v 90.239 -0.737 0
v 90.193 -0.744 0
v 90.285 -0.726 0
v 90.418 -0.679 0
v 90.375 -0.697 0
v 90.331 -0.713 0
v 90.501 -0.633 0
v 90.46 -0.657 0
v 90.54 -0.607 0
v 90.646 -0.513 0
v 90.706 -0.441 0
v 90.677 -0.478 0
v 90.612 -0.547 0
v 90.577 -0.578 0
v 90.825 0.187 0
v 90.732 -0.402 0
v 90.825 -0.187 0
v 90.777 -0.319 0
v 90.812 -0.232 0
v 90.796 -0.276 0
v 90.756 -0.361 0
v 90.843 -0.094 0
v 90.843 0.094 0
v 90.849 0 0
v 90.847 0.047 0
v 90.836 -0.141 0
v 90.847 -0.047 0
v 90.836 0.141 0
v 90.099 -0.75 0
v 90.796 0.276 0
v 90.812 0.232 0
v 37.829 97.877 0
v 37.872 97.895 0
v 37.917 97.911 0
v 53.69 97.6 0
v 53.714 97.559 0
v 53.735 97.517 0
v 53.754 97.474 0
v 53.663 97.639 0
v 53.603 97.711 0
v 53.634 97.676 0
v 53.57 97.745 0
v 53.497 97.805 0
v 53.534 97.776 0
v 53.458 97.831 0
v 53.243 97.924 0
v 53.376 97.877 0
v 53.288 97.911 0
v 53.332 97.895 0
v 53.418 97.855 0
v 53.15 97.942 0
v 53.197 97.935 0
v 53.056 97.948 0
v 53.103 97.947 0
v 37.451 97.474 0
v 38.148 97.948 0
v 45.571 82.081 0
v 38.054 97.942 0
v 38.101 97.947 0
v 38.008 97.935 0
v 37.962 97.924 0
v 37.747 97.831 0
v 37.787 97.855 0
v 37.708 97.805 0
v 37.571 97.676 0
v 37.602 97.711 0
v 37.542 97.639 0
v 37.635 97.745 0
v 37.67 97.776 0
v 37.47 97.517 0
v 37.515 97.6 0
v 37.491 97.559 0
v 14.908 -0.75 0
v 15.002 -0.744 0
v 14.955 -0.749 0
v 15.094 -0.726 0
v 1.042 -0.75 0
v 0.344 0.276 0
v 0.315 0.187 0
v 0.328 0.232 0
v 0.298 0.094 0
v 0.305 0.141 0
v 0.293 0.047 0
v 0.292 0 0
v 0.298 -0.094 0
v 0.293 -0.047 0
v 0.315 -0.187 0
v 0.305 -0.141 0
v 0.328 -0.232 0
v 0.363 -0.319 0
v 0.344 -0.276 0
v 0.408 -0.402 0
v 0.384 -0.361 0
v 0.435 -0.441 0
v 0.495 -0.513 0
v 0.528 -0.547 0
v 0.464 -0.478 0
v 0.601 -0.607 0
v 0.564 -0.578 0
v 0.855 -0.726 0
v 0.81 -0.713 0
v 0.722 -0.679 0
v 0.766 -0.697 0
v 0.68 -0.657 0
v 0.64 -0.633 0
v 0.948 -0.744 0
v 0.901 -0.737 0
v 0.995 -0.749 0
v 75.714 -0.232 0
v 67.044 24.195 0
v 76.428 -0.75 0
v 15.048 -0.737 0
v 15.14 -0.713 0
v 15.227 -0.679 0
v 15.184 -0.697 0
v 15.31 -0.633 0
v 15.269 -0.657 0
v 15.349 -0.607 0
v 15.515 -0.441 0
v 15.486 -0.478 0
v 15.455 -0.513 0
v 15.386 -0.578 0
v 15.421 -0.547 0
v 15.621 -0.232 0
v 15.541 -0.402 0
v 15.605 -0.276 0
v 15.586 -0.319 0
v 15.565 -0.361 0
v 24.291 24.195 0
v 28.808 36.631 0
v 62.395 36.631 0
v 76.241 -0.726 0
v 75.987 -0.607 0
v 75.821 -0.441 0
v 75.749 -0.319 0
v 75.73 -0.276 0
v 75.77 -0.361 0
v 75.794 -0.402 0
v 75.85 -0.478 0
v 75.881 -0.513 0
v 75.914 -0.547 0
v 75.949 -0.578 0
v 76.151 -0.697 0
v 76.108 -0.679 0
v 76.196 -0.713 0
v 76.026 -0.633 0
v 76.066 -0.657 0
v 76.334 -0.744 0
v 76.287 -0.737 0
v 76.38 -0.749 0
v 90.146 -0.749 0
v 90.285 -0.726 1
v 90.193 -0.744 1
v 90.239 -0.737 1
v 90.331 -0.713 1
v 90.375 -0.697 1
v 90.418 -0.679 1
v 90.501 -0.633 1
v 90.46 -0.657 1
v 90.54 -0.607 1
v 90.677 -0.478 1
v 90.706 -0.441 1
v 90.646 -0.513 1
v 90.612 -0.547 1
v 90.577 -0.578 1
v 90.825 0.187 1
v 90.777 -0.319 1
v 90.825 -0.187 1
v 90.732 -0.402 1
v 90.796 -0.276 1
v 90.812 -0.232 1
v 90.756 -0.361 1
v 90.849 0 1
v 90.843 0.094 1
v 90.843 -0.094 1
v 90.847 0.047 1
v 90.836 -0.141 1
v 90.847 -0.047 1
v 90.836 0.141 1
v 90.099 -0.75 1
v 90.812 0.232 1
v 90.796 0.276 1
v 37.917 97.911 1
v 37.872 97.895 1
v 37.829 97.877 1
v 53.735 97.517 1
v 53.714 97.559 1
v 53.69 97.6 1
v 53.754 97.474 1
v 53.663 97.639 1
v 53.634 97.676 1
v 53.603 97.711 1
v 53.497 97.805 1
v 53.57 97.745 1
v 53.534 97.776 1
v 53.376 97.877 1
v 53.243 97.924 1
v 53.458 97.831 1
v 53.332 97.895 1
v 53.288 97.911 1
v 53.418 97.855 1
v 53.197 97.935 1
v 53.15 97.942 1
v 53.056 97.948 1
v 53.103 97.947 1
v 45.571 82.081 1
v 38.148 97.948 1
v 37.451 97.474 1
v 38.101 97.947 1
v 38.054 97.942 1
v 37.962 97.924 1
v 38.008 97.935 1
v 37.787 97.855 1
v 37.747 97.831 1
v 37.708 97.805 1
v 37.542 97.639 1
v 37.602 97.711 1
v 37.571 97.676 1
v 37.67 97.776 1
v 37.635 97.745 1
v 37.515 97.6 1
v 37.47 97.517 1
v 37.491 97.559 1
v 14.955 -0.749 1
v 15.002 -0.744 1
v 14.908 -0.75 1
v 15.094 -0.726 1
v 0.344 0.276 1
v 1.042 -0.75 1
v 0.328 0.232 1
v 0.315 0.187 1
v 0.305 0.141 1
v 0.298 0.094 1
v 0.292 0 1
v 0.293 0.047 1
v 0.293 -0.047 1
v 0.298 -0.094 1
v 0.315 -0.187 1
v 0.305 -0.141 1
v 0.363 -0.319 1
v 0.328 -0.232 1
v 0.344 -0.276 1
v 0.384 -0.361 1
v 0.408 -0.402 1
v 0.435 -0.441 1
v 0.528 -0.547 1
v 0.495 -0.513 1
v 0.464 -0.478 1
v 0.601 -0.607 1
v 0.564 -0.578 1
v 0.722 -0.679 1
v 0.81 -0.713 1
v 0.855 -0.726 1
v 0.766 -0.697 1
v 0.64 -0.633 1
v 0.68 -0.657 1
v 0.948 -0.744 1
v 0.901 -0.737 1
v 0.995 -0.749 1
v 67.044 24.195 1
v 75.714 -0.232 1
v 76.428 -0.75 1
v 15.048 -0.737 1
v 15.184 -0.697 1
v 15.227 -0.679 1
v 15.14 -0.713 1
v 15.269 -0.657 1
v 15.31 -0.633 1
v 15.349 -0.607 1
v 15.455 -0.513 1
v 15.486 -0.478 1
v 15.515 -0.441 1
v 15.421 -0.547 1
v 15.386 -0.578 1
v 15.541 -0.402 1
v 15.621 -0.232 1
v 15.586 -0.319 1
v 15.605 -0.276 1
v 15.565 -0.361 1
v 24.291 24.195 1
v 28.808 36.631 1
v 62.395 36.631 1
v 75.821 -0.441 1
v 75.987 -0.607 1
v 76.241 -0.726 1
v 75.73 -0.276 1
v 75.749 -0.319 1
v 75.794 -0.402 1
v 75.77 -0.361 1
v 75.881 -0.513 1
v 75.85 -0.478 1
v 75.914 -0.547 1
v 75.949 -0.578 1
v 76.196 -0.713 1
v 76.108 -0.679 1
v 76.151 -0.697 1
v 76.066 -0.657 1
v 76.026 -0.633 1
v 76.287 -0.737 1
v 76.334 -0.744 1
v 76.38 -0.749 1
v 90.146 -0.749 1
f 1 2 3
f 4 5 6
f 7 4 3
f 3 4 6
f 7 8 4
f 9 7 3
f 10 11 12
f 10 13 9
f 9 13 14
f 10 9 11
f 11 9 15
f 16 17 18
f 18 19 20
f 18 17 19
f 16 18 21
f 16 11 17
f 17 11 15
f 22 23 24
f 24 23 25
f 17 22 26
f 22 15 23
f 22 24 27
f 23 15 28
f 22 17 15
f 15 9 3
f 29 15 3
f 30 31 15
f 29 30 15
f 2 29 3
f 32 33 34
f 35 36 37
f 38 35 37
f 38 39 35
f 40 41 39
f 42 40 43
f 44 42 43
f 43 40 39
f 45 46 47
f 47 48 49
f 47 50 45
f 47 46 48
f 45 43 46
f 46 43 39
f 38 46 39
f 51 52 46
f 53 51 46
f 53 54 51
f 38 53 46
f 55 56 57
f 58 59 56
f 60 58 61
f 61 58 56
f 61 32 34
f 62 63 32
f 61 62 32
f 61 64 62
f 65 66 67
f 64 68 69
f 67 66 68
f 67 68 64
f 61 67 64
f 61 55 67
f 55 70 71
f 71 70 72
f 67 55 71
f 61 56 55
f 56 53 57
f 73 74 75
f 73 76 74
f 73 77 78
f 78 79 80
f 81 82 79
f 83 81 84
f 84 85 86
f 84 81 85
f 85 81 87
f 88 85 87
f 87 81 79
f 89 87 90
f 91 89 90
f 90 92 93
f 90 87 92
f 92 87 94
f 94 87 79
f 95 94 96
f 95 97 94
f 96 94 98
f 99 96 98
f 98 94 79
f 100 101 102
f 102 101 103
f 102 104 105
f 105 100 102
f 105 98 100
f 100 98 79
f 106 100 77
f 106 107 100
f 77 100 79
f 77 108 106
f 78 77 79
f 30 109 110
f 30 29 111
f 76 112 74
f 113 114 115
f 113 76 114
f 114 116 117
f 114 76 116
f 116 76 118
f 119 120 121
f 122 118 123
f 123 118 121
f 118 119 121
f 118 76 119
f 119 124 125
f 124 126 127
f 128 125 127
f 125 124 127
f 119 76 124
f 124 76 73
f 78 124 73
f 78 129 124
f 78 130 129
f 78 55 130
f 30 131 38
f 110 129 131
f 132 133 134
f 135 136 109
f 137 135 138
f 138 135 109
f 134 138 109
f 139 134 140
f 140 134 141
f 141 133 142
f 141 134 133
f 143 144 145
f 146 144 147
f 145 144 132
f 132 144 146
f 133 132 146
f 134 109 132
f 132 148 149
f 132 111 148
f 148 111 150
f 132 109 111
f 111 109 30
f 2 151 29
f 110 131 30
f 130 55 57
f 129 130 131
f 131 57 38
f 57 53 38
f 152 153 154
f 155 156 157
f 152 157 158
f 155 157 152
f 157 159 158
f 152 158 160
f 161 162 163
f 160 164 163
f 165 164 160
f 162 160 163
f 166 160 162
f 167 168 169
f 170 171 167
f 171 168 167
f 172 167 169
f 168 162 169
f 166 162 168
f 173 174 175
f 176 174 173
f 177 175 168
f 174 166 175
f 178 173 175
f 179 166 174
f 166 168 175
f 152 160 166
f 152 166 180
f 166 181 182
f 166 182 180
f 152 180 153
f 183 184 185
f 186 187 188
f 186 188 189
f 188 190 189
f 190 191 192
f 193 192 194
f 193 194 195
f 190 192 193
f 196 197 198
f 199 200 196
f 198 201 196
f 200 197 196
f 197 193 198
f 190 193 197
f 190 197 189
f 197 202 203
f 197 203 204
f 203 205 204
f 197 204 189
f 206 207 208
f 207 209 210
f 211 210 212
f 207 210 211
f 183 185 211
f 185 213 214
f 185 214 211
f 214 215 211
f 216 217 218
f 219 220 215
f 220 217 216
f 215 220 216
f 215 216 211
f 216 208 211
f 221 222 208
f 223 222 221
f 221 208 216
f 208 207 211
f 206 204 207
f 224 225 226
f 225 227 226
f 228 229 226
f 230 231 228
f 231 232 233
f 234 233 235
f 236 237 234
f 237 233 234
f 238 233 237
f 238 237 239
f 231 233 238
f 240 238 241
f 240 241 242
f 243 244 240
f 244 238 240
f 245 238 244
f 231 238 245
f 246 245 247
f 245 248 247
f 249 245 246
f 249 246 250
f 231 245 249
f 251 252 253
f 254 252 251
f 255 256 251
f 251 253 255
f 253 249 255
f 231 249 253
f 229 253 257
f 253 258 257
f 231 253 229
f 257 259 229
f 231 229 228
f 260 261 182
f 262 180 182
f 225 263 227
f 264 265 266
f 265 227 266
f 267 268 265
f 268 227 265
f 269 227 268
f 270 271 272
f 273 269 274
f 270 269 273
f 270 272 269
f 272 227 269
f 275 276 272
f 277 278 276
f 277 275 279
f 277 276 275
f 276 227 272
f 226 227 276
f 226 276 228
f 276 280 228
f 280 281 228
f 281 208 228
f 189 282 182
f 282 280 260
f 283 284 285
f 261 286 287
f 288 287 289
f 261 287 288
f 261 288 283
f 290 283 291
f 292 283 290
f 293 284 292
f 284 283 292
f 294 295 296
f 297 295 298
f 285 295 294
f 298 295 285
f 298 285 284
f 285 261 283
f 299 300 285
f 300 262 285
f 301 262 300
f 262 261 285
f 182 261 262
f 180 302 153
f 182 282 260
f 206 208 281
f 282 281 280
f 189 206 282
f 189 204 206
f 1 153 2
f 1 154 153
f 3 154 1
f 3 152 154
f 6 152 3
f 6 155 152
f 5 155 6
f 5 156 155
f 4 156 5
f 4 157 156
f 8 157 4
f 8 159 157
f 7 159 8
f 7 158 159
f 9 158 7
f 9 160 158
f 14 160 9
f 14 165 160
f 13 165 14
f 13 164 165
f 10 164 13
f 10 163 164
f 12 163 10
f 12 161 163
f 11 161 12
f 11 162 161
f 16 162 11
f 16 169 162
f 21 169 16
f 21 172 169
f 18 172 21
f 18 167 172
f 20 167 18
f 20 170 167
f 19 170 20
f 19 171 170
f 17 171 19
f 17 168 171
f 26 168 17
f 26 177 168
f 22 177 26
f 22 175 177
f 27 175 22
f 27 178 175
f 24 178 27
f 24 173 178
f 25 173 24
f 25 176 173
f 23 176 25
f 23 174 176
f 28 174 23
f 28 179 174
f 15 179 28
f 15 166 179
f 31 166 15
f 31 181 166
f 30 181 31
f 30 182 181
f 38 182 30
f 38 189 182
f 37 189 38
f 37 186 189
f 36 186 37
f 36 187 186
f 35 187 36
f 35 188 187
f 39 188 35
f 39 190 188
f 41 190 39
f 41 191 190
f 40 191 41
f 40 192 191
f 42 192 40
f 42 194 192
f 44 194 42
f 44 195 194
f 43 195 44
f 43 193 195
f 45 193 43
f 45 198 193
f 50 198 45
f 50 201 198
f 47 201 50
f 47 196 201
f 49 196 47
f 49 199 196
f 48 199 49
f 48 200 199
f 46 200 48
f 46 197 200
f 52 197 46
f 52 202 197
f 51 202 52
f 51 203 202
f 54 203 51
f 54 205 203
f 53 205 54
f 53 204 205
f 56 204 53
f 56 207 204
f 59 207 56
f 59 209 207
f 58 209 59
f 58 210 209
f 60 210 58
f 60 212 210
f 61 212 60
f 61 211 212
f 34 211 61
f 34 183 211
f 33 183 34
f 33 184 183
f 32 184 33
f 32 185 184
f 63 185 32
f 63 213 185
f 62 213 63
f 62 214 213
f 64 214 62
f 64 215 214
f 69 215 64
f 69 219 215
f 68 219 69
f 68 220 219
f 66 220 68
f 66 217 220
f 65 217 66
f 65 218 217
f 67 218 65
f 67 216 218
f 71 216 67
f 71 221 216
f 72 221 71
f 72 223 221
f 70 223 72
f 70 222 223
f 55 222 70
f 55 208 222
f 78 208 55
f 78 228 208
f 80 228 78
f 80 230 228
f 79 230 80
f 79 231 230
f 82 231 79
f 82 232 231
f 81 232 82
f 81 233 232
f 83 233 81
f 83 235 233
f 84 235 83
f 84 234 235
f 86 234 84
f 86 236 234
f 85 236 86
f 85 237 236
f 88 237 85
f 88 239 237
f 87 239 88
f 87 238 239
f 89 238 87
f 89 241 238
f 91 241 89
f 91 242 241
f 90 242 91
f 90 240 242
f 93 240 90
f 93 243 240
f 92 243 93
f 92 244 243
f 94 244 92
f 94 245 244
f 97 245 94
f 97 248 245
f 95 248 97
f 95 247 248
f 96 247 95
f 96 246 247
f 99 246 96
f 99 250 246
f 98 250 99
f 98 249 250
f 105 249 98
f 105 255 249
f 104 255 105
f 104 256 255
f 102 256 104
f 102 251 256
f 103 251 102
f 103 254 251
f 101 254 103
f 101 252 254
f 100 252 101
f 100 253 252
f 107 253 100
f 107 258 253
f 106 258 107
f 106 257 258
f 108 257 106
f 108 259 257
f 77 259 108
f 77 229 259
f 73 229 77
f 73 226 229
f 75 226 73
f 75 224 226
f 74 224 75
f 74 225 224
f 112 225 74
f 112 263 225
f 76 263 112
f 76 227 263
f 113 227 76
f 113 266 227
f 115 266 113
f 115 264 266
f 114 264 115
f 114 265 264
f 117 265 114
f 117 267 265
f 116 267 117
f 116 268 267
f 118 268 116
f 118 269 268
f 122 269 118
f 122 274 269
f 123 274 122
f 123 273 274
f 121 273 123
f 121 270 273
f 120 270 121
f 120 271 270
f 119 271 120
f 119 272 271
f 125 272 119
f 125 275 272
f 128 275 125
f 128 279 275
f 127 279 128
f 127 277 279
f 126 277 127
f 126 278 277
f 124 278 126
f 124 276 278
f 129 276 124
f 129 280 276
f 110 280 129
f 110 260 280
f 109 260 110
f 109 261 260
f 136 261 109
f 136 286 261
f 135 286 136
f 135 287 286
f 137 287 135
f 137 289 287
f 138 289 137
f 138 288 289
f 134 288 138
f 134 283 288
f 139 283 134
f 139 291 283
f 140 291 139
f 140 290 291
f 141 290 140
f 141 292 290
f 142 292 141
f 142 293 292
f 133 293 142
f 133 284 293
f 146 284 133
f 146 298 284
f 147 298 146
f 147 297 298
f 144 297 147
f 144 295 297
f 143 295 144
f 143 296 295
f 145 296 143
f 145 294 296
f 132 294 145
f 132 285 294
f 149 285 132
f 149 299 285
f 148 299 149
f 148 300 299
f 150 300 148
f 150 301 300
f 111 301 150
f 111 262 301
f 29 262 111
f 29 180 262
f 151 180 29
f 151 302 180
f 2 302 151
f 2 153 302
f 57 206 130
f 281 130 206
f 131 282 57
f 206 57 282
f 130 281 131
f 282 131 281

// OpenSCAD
//Sign front-face generator V3 - bigclivedotcom
//All variables must match the sign body sizes
letter = "A"; //Sign character to make
style = "Noto Mono"; //See "Help" and "Font List"
size = 100; //Size of character
$fn=100; //Curve facets - higher is smoother
walls = 2; //Side wall thickness
face = 1; //Face thickness
fit = 0.5; //Slight shrink of face for easier fitting
//Don't change variables below here
sized=size-(2*walls);
linear_extrude(height=face)
minkowski(){
     text(letter,sized,style);
     circle((walls/2)-fit/2);
}
